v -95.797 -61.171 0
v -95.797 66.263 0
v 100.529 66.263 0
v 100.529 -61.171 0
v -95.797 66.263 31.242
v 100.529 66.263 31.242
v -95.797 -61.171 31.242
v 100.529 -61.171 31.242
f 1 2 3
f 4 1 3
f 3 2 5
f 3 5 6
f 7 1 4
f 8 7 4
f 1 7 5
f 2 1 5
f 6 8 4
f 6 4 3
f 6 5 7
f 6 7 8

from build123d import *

# Parameters (mm, degrees)
F0_W     = 196.3254287839
F0_H     = 127.4335458875
F1_DEPTH = 31.242
F3_D     = 7.62
F3_DEPTH = 127
F3_TIP   = 2.2892789585
F4_DEPTH = 22.86


with BuildPart() as f1:
    # F0 (on Top) → F1 (new body)
    with BuildSketch(Plane.XY):
        with Locations((2.3659057915, 2.5462694466)):
            Rectangle(F0_W, F0_H)
    extrude(amount=F1_DEPTH)

    # F3
    with Locations(Plane.XZ.offset(61.1705034971)):
        with Locations((55.6040331721, 14.9457631633)):
            Hole(F3_D / 2, depth=F3_DEPTH)
            with Locations((0, 0, -(F3_DEPTH + F3_TIP / 2))):  # 118° drill point
                Cone(0, F3_D / 2, F3_TIP, mode=Mode.SUBTRACT)

    # F4 (add): a face of the model
    f4_faces = [f1.faces().sort_by_distance(p)[0] for p in [
        (2.3659057915, 2.5462694466, 31.242),
    ]]
    extrude(f4_faces, amount=-F4_DEPTH)


solid = f1.part
